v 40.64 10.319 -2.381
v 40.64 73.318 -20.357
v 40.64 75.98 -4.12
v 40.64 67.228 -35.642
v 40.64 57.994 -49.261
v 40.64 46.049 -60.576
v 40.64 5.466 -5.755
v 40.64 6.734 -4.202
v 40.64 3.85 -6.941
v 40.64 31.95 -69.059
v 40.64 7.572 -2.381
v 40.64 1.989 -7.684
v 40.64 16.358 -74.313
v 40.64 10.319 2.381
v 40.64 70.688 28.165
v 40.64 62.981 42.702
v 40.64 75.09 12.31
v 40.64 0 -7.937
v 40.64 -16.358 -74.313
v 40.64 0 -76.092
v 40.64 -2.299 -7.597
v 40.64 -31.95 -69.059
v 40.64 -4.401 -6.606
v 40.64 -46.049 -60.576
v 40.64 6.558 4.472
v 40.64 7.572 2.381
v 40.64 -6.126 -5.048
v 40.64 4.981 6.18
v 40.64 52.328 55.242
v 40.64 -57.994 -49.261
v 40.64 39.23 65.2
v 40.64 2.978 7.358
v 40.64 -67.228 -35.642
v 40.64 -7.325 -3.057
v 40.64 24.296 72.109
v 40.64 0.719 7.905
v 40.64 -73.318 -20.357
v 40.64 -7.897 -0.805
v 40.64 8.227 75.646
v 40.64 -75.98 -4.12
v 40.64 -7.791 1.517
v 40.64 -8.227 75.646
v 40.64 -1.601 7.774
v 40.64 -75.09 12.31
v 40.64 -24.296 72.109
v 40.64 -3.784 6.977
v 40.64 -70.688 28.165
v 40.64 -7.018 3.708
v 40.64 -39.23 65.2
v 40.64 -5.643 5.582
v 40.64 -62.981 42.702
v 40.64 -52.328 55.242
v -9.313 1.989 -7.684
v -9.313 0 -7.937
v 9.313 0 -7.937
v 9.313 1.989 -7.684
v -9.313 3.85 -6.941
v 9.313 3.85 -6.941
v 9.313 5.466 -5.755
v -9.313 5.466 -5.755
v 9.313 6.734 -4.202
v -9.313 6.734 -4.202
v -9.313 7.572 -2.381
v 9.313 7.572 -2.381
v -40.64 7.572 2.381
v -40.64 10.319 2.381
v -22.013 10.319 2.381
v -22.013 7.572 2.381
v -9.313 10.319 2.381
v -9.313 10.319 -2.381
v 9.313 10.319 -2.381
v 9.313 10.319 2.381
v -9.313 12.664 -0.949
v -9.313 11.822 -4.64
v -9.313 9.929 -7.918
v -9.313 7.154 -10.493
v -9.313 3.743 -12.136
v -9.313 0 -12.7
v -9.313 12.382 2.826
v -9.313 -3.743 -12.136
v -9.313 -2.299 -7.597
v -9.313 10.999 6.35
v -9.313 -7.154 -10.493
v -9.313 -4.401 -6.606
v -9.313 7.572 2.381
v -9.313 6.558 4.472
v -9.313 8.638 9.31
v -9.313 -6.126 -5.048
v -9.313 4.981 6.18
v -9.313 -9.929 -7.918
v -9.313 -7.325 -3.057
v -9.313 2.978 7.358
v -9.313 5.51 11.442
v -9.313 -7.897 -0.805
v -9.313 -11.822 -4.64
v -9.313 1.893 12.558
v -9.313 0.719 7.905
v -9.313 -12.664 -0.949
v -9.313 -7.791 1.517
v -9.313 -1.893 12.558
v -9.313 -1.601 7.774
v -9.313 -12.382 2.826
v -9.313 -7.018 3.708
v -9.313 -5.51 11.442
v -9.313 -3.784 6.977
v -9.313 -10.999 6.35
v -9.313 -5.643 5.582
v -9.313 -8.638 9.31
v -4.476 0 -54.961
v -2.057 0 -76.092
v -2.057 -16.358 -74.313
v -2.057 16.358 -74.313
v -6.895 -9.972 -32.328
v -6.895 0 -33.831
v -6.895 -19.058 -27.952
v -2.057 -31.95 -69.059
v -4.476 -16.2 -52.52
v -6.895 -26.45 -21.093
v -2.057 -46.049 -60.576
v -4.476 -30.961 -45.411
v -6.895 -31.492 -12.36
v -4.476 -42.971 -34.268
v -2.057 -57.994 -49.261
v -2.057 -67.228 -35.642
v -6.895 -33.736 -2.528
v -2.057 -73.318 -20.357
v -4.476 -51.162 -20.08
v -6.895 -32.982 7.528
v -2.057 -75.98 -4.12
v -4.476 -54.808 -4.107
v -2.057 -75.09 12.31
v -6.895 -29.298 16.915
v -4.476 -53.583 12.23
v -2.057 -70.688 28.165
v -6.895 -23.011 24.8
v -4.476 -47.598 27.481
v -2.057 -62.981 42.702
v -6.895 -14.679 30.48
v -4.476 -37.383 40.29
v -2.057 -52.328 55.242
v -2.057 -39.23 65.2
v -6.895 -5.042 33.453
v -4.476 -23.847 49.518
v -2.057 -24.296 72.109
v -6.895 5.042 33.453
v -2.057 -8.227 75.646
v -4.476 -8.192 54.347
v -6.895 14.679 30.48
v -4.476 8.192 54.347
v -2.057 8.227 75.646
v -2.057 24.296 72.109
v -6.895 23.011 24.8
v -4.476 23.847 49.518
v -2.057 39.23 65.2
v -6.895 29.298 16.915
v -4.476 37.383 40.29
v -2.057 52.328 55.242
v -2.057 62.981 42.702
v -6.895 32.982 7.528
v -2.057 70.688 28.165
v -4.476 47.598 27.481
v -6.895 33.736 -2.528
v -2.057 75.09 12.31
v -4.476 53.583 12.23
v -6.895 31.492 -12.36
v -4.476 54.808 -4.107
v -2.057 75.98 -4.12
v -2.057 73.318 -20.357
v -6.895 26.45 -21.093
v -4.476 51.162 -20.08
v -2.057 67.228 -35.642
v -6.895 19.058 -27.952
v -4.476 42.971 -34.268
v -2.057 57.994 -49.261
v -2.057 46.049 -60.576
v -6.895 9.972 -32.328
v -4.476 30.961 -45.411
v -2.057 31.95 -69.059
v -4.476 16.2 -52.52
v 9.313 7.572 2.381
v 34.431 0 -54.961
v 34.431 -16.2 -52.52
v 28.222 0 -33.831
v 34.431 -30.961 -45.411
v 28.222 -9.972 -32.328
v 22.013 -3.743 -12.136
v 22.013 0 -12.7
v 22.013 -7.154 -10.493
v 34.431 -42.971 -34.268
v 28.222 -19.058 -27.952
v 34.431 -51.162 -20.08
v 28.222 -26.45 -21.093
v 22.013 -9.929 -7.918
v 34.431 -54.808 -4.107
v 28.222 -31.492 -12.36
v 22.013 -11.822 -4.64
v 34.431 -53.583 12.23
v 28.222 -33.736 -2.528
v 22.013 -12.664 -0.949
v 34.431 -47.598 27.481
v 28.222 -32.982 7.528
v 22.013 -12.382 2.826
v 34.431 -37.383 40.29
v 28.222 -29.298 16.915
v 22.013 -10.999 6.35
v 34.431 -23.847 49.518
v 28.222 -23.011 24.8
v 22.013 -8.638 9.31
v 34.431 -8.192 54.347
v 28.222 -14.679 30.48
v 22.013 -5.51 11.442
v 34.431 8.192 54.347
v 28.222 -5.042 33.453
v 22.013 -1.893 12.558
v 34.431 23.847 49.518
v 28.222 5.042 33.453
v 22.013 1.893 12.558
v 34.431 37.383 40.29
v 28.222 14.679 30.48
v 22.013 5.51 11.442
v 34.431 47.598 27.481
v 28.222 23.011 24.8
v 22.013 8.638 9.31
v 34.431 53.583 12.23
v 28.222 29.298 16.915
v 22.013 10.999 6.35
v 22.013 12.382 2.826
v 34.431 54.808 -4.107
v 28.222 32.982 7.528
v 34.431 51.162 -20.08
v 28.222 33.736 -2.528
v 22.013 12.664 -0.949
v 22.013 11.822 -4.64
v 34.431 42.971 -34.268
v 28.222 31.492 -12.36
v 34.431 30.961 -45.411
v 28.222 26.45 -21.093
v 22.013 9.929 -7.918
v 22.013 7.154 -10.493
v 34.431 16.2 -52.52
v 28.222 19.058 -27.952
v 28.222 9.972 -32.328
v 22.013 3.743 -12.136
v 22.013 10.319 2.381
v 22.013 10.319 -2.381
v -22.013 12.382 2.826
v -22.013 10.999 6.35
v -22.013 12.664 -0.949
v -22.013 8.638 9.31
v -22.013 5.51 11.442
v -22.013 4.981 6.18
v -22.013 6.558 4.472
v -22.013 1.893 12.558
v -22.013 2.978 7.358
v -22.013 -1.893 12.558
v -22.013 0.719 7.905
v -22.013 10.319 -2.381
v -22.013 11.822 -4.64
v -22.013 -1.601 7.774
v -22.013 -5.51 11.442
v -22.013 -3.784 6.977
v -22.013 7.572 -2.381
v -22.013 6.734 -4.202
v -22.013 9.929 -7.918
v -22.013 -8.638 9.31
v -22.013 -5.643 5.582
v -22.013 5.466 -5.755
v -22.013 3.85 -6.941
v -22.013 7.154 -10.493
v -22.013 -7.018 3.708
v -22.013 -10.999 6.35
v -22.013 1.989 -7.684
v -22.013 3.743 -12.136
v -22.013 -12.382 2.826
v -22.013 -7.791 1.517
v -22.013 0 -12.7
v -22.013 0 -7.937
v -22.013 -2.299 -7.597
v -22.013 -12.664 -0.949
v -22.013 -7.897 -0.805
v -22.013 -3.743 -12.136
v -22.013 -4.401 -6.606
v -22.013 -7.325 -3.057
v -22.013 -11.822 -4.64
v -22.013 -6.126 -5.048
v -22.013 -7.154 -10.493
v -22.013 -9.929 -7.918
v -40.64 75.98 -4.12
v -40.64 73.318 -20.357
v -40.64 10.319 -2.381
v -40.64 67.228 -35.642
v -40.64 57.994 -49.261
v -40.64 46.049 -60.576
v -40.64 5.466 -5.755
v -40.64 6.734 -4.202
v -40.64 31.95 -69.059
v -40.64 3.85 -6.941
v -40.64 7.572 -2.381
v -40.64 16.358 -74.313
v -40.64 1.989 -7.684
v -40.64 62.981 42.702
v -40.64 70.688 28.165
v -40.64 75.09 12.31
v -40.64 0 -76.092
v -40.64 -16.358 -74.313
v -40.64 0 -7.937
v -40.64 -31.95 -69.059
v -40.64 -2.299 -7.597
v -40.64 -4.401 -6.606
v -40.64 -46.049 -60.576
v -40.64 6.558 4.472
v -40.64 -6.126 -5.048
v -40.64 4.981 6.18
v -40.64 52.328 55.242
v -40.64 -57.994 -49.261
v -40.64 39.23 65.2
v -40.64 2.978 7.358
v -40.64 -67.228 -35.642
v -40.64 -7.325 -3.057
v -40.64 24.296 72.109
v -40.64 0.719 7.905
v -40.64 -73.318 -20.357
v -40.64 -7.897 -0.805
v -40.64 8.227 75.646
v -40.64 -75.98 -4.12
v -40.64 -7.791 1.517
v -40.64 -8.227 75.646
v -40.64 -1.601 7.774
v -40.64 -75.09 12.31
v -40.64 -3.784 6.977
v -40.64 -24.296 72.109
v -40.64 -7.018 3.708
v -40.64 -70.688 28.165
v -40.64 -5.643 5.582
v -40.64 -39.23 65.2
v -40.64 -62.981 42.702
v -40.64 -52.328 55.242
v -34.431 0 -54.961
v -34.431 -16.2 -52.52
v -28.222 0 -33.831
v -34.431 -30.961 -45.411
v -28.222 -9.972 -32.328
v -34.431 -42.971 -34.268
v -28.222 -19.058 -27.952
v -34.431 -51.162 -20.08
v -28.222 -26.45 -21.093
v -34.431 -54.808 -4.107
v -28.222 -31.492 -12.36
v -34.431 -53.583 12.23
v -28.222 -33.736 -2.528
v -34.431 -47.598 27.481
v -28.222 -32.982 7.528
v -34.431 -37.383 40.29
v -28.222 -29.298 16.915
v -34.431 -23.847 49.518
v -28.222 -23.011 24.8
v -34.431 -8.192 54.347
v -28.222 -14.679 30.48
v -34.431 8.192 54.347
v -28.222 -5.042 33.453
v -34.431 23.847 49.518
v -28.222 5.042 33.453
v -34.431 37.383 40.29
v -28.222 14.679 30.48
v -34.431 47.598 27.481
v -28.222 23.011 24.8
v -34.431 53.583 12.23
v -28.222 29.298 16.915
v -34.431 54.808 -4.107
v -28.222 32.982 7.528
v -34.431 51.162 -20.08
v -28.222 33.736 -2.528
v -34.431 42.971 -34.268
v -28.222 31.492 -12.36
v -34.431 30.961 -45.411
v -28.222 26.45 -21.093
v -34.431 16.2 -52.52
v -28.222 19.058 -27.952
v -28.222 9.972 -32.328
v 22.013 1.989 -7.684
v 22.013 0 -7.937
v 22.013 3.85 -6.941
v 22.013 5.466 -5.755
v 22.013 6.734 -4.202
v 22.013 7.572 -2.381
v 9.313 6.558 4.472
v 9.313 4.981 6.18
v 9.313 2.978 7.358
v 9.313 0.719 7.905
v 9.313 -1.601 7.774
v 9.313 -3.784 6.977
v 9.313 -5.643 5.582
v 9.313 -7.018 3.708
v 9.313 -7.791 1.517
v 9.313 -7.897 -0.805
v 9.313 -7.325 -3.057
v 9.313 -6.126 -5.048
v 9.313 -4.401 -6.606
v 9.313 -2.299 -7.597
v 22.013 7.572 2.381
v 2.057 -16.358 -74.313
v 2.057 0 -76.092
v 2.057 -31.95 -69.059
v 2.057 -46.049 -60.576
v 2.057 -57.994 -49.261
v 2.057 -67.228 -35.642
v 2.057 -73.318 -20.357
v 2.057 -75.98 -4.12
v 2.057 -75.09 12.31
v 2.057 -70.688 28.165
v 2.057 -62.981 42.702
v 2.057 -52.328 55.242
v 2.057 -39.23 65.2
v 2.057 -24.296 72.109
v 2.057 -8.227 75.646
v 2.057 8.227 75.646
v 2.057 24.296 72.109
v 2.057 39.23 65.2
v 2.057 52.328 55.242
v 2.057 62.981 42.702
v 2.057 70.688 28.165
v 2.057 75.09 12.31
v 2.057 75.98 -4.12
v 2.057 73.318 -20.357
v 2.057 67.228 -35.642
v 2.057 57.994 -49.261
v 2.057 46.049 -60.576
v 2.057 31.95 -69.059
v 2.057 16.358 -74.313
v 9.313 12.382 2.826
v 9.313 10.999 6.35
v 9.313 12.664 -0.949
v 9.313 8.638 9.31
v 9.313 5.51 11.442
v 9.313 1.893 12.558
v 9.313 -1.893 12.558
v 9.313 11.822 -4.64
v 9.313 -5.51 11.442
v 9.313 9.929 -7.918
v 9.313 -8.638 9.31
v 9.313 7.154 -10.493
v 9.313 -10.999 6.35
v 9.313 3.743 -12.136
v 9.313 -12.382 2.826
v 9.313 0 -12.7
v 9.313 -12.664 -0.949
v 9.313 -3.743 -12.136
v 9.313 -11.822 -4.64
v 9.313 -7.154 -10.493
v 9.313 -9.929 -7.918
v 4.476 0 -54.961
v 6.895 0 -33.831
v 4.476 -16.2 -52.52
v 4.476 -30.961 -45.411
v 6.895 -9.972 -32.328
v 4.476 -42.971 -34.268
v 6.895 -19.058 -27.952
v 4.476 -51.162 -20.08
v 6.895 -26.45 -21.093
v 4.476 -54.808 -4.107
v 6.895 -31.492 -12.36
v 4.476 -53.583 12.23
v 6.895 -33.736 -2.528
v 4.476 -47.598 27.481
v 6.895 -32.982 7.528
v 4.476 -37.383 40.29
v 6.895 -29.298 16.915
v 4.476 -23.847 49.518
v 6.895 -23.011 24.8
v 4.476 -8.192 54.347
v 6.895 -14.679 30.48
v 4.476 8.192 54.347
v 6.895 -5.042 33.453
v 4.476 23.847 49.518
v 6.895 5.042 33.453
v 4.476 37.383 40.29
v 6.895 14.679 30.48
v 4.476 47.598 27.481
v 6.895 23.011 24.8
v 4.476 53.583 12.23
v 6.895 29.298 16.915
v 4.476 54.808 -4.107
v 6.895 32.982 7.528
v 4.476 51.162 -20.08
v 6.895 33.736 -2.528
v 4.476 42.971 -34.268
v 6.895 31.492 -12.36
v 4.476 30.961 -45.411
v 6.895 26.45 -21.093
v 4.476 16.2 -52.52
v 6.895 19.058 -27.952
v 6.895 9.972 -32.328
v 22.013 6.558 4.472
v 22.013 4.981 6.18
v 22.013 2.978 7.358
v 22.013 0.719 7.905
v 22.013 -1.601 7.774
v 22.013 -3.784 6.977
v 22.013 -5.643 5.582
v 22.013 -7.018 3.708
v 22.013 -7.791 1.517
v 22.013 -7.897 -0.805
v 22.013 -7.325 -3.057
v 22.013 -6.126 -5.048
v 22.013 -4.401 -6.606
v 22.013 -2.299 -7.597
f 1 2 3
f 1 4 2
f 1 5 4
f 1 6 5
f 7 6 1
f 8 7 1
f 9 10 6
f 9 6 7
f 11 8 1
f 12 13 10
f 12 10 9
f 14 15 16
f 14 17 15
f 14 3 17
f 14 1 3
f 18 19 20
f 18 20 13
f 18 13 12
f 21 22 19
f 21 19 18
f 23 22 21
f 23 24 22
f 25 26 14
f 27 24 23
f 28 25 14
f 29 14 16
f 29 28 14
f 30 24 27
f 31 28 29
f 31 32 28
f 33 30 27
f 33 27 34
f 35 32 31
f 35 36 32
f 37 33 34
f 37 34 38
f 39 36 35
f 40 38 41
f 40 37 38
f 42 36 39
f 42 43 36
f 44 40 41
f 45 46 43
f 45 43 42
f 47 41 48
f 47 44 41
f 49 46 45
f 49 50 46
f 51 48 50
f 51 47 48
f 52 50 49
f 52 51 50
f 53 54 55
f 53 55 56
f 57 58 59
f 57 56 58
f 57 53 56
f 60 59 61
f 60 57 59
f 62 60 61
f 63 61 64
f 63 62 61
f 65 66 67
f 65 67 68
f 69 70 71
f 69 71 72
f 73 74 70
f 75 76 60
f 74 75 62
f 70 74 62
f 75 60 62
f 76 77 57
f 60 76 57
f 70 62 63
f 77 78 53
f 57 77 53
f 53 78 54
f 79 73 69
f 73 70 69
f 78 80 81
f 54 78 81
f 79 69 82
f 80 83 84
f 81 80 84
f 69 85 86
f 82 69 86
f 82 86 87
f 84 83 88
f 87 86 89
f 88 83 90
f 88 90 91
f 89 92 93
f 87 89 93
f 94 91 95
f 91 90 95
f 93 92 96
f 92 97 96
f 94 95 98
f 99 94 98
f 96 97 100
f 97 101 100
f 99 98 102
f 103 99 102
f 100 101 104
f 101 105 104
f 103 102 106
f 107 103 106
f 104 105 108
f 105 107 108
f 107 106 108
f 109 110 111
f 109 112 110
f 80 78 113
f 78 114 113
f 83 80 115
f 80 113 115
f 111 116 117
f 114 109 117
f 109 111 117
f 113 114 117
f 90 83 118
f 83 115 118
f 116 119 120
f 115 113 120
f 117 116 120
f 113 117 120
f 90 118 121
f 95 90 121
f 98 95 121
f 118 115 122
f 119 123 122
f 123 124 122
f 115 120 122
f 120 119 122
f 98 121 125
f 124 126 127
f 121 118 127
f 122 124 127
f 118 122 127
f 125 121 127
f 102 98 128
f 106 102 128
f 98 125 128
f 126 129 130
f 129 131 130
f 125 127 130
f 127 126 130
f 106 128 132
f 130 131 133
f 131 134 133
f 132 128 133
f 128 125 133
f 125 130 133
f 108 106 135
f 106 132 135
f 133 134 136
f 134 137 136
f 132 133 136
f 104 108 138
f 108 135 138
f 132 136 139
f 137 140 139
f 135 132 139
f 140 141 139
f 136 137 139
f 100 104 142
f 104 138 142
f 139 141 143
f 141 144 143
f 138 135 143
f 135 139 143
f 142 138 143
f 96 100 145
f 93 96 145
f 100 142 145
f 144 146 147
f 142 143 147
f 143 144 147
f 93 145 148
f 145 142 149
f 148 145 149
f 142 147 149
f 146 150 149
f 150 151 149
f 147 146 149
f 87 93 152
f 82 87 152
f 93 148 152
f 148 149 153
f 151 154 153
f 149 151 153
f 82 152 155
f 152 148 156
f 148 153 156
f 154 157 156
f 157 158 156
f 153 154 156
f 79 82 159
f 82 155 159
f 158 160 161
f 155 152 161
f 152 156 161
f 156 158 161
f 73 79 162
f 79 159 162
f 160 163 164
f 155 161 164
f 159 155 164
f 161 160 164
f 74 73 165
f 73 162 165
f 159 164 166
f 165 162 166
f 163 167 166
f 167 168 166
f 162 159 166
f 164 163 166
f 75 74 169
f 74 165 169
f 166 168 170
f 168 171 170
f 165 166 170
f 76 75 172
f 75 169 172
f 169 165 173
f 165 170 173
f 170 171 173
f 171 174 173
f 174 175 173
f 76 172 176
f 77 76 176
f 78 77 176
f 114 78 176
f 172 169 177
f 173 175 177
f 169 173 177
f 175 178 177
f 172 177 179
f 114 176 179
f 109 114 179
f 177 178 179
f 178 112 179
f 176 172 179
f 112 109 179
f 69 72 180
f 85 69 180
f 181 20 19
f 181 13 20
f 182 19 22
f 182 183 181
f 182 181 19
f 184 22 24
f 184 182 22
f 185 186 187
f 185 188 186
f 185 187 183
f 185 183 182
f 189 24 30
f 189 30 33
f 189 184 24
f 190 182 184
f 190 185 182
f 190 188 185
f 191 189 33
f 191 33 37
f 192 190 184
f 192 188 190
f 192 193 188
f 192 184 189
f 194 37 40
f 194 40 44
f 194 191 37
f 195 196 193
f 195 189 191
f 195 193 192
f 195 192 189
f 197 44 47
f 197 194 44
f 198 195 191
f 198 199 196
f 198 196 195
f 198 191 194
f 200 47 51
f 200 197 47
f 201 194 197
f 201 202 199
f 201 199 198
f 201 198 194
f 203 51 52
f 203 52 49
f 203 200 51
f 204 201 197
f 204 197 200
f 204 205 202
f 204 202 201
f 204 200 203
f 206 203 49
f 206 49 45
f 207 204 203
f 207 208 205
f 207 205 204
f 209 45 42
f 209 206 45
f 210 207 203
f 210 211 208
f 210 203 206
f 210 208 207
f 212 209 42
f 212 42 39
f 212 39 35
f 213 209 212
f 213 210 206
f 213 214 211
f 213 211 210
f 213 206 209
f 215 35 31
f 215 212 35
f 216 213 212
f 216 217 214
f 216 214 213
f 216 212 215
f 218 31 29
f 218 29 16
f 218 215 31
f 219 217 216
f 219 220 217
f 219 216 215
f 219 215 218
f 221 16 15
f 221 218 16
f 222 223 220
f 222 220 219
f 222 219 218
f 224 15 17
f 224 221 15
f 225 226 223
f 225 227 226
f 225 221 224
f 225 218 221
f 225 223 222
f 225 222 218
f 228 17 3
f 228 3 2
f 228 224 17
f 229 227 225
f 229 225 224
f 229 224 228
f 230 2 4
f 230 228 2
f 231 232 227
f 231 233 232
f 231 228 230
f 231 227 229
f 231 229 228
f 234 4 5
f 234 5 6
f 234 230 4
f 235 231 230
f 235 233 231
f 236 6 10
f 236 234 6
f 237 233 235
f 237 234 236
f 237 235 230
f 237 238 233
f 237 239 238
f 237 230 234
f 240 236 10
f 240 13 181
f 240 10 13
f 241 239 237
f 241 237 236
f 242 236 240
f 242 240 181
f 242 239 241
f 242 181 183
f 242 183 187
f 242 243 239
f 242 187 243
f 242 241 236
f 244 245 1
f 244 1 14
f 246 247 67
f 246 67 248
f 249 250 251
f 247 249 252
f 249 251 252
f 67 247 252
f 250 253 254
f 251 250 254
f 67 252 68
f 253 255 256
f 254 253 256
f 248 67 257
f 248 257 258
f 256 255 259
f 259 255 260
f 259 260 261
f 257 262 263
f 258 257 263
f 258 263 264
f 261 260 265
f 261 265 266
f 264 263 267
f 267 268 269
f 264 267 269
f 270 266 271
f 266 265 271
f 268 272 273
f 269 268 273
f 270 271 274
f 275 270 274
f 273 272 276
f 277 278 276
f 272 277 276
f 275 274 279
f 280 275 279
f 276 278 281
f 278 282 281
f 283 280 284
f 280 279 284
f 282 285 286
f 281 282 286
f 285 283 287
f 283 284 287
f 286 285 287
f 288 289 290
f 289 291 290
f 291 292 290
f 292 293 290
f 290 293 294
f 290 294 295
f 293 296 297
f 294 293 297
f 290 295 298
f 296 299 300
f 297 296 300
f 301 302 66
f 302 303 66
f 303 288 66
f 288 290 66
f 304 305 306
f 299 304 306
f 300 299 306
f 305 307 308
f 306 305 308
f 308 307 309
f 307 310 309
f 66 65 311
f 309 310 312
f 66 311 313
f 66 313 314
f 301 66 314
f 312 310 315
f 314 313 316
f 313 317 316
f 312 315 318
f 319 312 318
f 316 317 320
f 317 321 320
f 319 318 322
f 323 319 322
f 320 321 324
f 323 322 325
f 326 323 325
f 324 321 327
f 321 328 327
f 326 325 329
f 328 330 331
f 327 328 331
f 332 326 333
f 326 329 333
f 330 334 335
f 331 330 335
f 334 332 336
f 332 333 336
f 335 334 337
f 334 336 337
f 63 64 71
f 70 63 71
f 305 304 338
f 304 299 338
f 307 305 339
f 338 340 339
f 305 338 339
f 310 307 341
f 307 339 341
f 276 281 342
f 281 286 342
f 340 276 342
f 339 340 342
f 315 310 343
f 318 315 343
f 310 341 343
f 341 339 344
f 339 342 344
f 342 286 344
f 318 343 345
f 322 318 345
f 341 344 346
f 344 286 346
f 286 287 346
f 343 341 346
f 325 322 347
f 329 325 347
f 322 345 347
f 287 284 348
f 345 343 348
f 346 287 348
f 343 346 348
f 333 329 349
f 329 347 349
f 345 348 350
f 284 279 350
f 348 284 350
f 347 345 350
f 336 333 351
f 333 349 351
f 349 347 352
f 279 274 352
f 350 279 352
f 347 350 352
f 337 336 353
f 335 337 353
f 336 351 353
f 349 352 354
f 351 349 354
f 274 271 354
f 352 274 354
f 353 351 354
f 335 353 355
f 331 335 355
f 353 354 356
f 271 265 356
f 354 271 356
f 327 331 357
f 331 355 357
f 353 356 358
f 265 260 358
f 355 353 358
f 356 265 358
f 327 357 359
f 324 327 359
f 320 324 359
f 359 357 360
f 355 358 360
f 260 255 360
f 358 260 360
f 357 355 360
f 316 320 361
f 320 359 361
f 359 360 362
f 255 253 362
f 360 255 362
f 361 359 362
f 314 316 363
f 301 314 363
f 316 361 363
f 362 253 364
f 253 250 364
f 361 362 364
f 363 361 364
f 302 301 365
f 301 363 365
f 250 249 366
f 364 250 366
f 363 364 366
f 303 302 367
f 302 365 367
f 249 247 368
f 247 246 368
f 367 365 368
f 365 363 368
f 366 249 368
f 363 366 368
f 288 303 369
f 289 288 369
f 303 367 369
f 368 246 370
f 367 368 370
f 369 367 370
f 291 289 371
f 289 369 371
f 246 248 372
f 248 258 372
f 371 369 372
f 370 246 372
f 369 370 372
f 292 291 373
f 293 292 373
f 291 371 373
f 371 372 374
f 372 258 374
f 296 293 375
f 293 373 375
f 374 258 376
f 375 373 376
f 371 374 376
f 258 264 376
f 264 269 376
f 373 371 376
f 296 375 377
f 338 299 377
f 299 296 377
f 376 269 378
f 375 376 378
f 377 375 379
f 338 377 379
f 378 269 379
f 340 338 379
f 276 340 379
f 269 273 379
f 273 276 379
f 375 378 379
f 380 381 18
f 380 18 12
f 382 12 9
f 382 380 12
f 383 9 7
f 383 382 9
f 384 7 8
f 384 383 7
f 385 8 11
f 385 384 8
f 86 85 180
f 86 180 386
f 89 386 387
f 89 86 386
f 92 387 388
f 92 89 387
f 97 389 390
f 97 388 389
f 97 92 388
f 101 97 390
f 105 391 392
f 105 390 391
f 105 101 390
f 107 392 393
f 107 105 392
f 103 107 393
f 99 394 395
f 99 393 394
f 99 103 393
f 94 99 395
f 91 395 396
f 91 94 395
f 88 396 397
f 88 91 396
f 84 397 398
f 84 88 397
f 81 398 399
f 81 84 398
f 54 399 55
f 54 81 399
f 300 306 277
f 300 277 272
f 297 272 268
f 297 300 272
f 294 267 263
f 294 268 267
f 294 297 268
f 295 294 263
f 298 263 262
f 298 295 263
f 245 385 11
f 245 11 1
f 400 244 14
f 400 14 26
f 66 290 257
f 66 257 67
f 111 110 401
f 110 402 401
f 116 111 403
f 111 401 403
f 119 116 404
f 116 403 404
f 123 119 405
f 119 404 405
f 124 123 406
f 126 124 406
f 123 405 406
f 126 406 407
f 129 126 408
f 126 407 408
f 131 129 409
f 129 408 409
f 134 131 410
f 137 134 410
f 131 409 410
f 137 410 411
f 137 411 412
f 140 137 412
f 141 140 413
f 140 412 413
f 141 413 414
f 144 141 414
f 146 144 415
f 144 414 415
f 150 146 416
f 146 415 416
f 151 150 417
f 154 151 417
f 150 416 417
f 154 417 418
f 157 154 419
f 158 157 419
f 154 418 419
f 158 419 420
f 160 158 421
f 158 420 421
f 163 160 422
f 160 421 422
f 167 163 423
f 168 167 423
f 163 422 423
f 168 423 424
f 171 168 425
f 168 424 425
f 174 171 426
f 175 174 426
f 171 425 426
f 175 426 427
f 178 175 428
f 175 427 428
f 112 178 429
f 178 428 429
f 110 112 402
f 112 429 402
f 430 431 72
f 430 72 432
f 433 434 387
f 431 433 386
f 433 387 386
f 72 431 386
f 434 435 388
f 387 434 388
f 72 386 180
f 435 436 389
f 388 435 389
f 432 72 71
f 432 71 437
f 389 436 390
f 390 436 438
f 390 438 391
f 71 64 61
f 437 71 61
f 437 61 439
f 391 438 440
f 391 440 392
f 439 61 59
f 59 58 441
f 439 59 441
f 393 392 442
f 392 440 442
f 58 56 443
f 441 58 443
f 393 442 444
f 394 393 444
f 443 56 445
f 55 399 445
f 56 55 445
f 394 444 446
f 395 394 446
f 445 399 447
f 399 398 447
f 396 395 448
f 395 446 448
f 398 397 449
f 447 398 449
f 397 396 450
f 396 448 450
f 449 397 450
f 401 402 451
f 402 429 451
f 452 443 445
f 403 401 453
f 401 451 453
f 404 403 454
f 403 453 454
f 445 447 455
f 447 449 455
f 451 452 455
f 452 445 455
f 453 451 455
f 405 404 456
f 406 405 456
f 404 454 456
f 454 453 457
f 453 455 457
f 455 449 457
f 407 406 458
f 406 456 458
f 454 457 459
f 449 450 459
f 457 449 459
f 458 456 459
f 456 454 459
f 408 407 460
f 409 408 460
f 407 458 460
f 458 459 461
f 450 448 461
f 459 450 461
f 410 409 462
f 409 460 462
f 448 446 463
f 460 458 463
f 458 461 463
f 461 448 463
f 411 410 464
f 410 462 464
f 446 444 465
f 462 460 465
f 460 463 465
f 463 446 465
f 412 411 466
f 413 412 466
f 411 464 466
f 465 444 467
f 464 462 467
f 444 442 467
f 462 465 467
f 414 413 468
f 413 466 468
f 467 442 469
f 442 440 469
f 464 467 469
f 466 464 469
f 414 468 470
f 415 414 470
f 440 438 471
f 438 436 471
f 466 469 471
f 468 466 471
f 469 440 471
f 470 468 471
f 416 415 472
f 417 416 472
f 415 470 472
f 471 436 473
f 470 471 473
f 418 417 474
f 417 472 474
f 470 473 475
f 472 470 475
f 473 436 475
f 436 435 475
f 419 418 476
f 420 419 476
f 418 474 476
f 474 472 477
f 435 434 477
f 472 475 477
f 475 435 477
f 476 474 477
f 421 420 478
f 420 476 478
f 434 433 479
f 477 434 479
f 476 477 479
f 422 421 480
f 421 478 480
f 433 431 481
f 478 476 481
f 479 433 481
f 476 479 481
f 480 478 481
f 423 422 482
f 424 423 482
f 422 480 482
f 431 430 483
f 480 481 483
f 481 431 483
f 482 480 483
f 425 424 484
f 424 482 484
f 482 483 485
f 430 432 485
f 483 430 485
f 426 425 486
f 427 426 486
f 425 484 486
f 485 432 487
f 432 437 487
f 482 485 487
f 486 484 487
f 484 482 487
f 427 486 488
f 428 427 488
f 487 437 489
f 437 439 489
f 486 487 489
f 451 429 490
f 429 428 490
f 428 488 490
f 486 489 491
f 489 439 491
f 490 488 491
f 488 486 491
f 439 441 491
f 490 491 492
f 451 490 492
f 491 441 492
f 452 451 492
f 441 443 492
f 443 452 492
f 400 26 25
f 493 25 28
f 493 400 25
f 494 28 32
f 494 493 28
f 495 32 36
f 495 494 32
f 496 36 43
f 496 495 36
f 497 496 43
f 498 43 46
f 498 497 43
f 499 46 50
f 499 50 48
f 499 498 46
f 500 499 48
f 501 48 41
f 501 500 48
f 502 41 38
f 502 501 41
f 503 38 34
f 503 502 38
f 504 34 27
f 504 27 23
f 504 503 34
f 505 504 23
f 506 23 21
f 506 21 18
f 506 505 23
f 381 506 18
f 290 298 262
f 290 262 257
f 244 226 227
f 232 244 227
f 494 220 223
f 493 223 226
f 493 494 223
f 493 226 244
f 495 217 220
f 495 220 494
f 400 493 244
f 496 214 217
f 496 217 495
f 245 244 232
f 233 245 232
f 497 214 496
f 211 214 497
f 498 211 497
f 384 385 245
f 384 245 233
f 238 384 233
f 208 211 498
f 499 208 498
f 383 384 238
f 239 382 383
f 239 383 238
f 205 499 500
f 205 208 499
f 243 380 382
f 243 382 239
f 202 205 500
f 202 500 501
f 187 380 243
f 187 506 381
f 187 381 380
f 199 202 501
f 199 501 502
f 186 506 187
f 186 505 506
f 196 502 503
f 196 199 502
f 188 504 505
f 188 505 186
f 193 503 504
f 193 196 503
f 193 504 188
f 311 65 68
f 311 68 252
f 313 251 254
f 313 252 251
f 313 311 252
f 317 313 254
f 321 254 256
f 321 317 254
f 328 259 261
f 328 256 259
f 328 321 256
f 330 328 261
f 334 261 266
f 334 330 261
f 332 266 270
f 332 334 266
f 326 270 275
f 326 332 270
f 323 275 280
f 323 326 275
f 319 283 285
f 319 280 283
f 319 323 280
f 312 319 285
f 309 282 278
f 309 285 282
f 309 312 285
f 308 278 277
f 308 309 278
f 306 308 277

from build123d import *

# Parameters (mm, degrees)
CUT_EXTRUDE1_START = -108.204
CUT_EXTRUDE1_DEPTH = 108.204


with BuildPart() as part:
    # Sketch1 → Revolve1 (revolve)
    with BuildSketch(Plane.XY, mode=Mode.PRIVATE) as revolve1_sk:
        Polygon((-22.013333333, 12.7), (-22.013333333, 6.35), (-40.64, 6.35), (-40.64, 76.09205), align=None)
        Polygon((-9.313333333, 12.7), (-2.0574, 76.09205), (2.0574, 76.09205), (9.313333333, 12.7), (9.313333333, 6.35), (-9.313333333, 6.35), align=None)
        Polygon((22.013333333, 6.35), (40.64, 6.35), (40.64, 76.09205), (22.013333333, 12.7), align=None)
    revolve(revolve1_sk.sketch.rotate(Axis((0, 0, 0), (-1, 0, 0)), 90), axis=Axis((0, 0, 0), (-1, 0, 0)))

    # Sketch2 → Cut-Extrude1 (cut)
    with BuildSketch(Plane(origin=(40.64, 0, 0), x_dir=(0, 0, -1), z_dir=(1, 0, 0)).offset(CUT_EXTRUDE1_START)):
        with BuildLine():
            ThreePointArc((-2.38125, 5.886607549), (0, 6.35), (2.38125, 5.886607549))
            Line((2.38125, 5.886607549), (2.38125, 7.571892411))
            ThreePointArc((2.38125, 7.571892411), (0, 7.9375), (-2.38125, 7.571892411))
            Line((-2.38125, 7.571892411), (-2.38125, 5.886607549))
        make_face()
        with BuildLine():
            Line((2.38125, 7.571892411), (2.38125, 5.886607549))
            ThreePointArc((2.38125, 5.886607549), (5.265141855, 3.549757914), (6.35, 0))
            ThreePointArc((6.35, 0), (-3.549757914, -5.265141855), (-2.38125, 5.886607549))
            Line((-2.38125, 5.886607549), (-2.38125, 7.571892411))
            ThreePointArc((-2.38125, 7.571892411), (-4.695888328, -6.399417088), (7.9375, 0))
            ThreePointArc((7.9375, 0), (6.399417088, 4.695888328), (2.38125, 7.571892411))
        make_face()
        with BuildLine():
            ThreePointArc((-2.38125, 7.571892411), (0, 7.9375), (2.38125, 7.571892411))
            Line((2.38125, 7.571892411), (2.38125, 10.31875))
            Line((2.38125, 10.31875), (-2.38125, 10.31875))
            Line((-2.38125, 10.31875), (-2.38125, 7.571892411))
        make_face()
        with BuildLine():
            Line((2.38125, 5.886607549), (2.38125, 5.55625))
            Line((2.38125, 5.55625), (-2.38125, 5.55625))
            Line((-2.38125, 5.55625), (-2.38125, 5.886607549))
            ThreePointArc((-2.38125, 5.886607549), (-3.549757914, -5.265141855), (6.35, 0))
            ThreePointArc((6.35, 0), (5.265141855, 3.549757914), (2.38125, 5.886607549))
        make_face()
        with BuildLine():
            Line((-2.38125, 5.55625), (2.38125, 5.55625))
            Line((2.38125, 5.55625), (2.38125, 5.886607549))
            ThreePointArc((2.38125, 5.886607549), (0, 6.35), (-2.38125, 5.886607549))
            Line((-2.38125, 5.886607549), (-2.38125, 5.55625))
        make_face()
    extrude(amount=CUT_EXTRUDE1_DEPTH, mode=Mode.SUBTRACT)


solid = part.part
